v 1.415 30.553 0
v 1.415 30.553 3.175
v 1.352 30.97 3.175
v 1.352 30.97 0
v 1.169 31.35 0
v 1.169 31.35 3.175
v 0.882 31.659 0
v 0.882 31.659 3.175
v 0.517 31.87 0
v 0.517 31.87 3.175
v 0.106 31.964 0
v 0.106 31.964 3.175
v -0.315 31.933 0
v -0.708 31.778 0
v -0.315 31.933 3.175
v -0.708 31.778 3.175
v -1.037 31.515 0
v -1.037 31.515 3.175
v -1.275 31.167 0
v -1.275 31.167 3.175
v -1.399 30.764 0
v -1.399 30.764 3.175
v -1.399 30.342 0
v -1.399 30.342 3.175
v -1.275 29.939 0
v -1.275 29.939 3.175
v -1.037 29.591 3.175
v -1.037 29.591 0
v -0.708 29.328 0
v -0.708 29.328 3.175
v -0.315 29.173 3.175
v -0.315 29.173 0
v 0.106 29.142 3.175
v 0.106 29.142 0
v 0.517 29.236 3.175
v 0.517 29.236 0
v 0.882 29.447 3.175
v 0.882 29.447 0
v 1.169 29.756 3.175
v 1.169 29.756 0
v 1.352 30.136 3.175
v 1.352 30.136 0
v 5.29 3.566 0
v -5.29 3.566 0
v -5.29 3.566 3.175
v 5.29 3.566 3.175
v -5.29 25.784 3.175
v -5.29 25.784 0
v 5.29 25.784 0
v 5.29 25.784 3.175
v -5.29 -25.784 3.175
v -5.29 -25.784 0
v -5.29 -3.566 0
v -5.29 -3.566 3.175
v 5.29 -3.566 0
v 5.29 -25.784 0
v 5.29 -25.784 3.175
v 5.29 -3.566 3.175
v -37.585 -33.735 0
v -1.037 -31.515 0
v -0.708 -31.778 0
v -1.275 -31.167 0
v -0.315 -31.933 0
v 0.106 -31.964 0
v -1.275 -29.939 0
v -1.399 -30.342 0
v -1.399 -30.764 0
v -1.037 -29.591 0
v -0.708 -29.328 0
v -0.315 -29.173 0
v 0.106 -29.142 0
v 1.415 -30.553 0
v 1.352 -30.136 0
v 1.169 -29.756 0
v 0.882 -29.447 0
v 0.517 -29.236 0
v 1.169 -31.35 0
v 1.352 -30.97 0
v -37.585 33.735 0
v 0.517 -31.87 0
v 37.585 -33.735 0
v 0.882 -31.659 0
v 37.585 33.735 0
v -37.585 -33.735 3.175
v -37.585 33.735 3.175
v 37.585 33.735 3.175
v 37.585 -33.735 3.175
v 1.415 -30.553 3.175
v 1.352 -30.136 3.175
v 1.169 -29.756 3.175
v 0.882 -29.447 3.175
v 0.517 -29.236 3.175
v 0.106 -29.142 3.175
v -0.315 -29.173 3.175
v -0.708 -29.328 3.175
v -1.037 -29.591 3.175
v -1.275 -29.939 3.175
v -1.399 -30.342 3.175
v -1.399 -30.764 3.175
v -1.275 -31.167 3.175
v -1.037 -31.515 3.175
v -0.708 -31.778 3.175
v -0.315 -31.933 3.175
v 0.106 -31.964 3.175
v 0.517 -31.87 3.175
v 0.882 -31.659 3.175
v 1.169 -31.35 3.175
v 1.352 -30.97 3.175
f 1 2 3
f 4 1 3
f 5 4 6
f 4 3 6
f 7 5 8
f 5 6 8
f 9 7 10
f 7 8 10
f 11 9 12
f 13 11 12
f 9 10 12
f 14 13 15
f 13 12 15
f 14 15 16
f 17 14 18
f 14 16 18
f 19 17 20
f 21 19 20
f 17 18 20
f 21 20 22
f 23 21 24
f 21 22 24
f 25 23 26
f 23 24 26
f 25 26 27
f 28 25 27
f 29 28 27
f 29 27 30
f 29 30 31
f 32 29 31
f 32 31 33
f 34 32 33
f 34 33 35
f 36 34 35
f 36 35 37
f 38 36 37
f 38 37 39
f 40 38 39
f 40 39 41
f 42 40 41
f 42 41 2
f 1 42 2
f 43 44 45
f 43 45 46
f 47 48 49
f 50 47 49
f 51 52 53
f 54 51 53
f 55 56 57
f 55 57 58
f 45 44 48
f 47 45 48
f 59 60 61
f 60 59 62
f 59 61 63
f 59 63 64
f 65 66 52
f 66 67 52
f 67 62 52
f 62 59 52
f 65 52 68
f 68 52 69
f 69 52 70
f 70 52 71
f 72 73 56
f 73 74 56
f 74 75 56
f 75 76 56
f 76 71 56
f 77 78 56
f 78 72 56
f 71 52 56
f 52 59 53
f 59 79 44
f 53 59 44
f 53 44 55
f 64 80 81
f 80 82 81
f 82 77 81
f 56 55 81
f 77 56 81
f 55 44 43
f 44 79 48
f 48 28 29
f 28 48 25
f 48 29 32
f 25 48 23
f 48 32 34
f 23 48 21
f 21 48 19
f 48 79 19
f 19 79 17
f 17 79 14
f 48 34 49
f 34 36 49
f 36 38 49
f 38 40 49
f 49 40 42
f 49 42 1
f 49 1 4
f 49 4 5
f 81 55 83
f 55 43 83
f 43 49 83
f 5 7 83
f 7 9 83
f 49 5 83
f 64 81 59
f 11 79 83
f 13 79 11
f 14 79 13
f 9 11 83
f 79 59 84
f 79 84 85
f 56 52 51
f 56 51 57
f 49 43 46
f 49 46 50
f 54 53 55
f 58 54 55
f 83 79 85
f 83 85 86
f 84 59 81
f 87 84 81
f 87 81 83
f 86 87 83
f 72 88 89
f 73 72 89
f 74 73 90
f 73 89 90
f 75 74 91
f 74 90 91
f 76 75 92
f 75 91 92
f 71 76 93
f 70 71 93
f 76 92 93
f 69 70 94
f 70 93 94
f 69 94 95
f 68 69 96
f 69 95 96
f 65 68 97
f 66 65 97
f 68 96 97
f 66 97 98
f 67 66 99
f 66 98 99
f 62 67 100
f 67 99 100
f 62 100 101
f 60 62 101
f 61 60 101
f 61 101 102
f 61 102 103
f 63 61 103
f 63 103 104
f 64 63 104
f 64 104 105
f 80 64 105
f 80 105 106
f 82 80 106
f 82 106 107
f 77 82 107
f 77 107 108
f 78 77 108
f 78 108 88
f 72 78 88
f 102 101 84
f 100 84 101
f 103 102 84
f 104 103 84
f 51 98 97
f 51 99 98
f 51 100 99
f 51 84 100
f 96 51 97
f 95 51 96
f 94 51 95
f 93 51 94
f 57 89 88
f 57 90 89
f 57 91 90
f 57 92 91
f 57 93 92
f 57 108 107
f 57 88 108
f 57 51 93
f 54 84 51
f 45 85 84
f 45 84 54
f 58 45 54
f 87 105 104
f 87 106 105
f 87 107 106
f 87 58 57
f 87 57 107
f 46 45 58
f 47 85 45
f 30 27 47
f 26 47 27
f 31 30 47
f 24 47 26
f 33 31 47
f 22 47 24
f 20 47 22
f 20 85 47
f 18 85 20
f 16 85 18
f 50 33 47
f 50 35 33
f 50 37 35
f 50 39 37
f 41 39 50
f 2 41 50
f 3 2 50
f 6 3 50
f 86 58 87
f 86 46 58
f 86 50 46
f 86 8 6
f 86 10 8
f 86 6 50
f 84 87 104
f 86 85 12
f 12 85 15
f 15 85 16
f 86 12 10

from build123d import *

# Parameters (mm, degrees)
SKETCH1_W           = 75.17
SKETCH1_H           = 67.47
SKETCH1_W_2         = 10.58
SKETCH1_H_2         = 22.218316852
BOSS_EXTRUDE1_DEPTH = 3.175
SKETCH2_R           = 1.415
CUT_EXTRUDE1_DEPTH  = 10


with BuildPart() as part:
    # Sketch1 → Boss-Extrude1 (new body)
    with BuildSketch(Plane.XY):
        Rectangle(SKETCH1_W, SKETCH1_H)
        with Locations((0, 14.675)):
            Rectangle(SKETCH1_W_2, SKETCH1_H_2, mode=Mode.SUBTRACT)
        with Locations((0, -14.675)):
            Rectangle(SKETCH1_W_2, SKETCH1_H_2, mode=Mode.SUBTRACT)
    extrude(amount=BOSS_EXTRUDE1_DEPTH)

    # Sketch2 → Cut-Extrude1 (cut)
    with BuildSketch(Plane.XY.offset(3.175)):
        with Locations((0, 30.553019485)):
            Circle(SKETCH2_R)
        with Locations((0, -30.553019485)):
            Circle(SKETCH2_R)
    extrude(amount=-CUT_EXTRUDE1_DEPTH, mode=Mode.SUBTRACT)


solid = part.part
